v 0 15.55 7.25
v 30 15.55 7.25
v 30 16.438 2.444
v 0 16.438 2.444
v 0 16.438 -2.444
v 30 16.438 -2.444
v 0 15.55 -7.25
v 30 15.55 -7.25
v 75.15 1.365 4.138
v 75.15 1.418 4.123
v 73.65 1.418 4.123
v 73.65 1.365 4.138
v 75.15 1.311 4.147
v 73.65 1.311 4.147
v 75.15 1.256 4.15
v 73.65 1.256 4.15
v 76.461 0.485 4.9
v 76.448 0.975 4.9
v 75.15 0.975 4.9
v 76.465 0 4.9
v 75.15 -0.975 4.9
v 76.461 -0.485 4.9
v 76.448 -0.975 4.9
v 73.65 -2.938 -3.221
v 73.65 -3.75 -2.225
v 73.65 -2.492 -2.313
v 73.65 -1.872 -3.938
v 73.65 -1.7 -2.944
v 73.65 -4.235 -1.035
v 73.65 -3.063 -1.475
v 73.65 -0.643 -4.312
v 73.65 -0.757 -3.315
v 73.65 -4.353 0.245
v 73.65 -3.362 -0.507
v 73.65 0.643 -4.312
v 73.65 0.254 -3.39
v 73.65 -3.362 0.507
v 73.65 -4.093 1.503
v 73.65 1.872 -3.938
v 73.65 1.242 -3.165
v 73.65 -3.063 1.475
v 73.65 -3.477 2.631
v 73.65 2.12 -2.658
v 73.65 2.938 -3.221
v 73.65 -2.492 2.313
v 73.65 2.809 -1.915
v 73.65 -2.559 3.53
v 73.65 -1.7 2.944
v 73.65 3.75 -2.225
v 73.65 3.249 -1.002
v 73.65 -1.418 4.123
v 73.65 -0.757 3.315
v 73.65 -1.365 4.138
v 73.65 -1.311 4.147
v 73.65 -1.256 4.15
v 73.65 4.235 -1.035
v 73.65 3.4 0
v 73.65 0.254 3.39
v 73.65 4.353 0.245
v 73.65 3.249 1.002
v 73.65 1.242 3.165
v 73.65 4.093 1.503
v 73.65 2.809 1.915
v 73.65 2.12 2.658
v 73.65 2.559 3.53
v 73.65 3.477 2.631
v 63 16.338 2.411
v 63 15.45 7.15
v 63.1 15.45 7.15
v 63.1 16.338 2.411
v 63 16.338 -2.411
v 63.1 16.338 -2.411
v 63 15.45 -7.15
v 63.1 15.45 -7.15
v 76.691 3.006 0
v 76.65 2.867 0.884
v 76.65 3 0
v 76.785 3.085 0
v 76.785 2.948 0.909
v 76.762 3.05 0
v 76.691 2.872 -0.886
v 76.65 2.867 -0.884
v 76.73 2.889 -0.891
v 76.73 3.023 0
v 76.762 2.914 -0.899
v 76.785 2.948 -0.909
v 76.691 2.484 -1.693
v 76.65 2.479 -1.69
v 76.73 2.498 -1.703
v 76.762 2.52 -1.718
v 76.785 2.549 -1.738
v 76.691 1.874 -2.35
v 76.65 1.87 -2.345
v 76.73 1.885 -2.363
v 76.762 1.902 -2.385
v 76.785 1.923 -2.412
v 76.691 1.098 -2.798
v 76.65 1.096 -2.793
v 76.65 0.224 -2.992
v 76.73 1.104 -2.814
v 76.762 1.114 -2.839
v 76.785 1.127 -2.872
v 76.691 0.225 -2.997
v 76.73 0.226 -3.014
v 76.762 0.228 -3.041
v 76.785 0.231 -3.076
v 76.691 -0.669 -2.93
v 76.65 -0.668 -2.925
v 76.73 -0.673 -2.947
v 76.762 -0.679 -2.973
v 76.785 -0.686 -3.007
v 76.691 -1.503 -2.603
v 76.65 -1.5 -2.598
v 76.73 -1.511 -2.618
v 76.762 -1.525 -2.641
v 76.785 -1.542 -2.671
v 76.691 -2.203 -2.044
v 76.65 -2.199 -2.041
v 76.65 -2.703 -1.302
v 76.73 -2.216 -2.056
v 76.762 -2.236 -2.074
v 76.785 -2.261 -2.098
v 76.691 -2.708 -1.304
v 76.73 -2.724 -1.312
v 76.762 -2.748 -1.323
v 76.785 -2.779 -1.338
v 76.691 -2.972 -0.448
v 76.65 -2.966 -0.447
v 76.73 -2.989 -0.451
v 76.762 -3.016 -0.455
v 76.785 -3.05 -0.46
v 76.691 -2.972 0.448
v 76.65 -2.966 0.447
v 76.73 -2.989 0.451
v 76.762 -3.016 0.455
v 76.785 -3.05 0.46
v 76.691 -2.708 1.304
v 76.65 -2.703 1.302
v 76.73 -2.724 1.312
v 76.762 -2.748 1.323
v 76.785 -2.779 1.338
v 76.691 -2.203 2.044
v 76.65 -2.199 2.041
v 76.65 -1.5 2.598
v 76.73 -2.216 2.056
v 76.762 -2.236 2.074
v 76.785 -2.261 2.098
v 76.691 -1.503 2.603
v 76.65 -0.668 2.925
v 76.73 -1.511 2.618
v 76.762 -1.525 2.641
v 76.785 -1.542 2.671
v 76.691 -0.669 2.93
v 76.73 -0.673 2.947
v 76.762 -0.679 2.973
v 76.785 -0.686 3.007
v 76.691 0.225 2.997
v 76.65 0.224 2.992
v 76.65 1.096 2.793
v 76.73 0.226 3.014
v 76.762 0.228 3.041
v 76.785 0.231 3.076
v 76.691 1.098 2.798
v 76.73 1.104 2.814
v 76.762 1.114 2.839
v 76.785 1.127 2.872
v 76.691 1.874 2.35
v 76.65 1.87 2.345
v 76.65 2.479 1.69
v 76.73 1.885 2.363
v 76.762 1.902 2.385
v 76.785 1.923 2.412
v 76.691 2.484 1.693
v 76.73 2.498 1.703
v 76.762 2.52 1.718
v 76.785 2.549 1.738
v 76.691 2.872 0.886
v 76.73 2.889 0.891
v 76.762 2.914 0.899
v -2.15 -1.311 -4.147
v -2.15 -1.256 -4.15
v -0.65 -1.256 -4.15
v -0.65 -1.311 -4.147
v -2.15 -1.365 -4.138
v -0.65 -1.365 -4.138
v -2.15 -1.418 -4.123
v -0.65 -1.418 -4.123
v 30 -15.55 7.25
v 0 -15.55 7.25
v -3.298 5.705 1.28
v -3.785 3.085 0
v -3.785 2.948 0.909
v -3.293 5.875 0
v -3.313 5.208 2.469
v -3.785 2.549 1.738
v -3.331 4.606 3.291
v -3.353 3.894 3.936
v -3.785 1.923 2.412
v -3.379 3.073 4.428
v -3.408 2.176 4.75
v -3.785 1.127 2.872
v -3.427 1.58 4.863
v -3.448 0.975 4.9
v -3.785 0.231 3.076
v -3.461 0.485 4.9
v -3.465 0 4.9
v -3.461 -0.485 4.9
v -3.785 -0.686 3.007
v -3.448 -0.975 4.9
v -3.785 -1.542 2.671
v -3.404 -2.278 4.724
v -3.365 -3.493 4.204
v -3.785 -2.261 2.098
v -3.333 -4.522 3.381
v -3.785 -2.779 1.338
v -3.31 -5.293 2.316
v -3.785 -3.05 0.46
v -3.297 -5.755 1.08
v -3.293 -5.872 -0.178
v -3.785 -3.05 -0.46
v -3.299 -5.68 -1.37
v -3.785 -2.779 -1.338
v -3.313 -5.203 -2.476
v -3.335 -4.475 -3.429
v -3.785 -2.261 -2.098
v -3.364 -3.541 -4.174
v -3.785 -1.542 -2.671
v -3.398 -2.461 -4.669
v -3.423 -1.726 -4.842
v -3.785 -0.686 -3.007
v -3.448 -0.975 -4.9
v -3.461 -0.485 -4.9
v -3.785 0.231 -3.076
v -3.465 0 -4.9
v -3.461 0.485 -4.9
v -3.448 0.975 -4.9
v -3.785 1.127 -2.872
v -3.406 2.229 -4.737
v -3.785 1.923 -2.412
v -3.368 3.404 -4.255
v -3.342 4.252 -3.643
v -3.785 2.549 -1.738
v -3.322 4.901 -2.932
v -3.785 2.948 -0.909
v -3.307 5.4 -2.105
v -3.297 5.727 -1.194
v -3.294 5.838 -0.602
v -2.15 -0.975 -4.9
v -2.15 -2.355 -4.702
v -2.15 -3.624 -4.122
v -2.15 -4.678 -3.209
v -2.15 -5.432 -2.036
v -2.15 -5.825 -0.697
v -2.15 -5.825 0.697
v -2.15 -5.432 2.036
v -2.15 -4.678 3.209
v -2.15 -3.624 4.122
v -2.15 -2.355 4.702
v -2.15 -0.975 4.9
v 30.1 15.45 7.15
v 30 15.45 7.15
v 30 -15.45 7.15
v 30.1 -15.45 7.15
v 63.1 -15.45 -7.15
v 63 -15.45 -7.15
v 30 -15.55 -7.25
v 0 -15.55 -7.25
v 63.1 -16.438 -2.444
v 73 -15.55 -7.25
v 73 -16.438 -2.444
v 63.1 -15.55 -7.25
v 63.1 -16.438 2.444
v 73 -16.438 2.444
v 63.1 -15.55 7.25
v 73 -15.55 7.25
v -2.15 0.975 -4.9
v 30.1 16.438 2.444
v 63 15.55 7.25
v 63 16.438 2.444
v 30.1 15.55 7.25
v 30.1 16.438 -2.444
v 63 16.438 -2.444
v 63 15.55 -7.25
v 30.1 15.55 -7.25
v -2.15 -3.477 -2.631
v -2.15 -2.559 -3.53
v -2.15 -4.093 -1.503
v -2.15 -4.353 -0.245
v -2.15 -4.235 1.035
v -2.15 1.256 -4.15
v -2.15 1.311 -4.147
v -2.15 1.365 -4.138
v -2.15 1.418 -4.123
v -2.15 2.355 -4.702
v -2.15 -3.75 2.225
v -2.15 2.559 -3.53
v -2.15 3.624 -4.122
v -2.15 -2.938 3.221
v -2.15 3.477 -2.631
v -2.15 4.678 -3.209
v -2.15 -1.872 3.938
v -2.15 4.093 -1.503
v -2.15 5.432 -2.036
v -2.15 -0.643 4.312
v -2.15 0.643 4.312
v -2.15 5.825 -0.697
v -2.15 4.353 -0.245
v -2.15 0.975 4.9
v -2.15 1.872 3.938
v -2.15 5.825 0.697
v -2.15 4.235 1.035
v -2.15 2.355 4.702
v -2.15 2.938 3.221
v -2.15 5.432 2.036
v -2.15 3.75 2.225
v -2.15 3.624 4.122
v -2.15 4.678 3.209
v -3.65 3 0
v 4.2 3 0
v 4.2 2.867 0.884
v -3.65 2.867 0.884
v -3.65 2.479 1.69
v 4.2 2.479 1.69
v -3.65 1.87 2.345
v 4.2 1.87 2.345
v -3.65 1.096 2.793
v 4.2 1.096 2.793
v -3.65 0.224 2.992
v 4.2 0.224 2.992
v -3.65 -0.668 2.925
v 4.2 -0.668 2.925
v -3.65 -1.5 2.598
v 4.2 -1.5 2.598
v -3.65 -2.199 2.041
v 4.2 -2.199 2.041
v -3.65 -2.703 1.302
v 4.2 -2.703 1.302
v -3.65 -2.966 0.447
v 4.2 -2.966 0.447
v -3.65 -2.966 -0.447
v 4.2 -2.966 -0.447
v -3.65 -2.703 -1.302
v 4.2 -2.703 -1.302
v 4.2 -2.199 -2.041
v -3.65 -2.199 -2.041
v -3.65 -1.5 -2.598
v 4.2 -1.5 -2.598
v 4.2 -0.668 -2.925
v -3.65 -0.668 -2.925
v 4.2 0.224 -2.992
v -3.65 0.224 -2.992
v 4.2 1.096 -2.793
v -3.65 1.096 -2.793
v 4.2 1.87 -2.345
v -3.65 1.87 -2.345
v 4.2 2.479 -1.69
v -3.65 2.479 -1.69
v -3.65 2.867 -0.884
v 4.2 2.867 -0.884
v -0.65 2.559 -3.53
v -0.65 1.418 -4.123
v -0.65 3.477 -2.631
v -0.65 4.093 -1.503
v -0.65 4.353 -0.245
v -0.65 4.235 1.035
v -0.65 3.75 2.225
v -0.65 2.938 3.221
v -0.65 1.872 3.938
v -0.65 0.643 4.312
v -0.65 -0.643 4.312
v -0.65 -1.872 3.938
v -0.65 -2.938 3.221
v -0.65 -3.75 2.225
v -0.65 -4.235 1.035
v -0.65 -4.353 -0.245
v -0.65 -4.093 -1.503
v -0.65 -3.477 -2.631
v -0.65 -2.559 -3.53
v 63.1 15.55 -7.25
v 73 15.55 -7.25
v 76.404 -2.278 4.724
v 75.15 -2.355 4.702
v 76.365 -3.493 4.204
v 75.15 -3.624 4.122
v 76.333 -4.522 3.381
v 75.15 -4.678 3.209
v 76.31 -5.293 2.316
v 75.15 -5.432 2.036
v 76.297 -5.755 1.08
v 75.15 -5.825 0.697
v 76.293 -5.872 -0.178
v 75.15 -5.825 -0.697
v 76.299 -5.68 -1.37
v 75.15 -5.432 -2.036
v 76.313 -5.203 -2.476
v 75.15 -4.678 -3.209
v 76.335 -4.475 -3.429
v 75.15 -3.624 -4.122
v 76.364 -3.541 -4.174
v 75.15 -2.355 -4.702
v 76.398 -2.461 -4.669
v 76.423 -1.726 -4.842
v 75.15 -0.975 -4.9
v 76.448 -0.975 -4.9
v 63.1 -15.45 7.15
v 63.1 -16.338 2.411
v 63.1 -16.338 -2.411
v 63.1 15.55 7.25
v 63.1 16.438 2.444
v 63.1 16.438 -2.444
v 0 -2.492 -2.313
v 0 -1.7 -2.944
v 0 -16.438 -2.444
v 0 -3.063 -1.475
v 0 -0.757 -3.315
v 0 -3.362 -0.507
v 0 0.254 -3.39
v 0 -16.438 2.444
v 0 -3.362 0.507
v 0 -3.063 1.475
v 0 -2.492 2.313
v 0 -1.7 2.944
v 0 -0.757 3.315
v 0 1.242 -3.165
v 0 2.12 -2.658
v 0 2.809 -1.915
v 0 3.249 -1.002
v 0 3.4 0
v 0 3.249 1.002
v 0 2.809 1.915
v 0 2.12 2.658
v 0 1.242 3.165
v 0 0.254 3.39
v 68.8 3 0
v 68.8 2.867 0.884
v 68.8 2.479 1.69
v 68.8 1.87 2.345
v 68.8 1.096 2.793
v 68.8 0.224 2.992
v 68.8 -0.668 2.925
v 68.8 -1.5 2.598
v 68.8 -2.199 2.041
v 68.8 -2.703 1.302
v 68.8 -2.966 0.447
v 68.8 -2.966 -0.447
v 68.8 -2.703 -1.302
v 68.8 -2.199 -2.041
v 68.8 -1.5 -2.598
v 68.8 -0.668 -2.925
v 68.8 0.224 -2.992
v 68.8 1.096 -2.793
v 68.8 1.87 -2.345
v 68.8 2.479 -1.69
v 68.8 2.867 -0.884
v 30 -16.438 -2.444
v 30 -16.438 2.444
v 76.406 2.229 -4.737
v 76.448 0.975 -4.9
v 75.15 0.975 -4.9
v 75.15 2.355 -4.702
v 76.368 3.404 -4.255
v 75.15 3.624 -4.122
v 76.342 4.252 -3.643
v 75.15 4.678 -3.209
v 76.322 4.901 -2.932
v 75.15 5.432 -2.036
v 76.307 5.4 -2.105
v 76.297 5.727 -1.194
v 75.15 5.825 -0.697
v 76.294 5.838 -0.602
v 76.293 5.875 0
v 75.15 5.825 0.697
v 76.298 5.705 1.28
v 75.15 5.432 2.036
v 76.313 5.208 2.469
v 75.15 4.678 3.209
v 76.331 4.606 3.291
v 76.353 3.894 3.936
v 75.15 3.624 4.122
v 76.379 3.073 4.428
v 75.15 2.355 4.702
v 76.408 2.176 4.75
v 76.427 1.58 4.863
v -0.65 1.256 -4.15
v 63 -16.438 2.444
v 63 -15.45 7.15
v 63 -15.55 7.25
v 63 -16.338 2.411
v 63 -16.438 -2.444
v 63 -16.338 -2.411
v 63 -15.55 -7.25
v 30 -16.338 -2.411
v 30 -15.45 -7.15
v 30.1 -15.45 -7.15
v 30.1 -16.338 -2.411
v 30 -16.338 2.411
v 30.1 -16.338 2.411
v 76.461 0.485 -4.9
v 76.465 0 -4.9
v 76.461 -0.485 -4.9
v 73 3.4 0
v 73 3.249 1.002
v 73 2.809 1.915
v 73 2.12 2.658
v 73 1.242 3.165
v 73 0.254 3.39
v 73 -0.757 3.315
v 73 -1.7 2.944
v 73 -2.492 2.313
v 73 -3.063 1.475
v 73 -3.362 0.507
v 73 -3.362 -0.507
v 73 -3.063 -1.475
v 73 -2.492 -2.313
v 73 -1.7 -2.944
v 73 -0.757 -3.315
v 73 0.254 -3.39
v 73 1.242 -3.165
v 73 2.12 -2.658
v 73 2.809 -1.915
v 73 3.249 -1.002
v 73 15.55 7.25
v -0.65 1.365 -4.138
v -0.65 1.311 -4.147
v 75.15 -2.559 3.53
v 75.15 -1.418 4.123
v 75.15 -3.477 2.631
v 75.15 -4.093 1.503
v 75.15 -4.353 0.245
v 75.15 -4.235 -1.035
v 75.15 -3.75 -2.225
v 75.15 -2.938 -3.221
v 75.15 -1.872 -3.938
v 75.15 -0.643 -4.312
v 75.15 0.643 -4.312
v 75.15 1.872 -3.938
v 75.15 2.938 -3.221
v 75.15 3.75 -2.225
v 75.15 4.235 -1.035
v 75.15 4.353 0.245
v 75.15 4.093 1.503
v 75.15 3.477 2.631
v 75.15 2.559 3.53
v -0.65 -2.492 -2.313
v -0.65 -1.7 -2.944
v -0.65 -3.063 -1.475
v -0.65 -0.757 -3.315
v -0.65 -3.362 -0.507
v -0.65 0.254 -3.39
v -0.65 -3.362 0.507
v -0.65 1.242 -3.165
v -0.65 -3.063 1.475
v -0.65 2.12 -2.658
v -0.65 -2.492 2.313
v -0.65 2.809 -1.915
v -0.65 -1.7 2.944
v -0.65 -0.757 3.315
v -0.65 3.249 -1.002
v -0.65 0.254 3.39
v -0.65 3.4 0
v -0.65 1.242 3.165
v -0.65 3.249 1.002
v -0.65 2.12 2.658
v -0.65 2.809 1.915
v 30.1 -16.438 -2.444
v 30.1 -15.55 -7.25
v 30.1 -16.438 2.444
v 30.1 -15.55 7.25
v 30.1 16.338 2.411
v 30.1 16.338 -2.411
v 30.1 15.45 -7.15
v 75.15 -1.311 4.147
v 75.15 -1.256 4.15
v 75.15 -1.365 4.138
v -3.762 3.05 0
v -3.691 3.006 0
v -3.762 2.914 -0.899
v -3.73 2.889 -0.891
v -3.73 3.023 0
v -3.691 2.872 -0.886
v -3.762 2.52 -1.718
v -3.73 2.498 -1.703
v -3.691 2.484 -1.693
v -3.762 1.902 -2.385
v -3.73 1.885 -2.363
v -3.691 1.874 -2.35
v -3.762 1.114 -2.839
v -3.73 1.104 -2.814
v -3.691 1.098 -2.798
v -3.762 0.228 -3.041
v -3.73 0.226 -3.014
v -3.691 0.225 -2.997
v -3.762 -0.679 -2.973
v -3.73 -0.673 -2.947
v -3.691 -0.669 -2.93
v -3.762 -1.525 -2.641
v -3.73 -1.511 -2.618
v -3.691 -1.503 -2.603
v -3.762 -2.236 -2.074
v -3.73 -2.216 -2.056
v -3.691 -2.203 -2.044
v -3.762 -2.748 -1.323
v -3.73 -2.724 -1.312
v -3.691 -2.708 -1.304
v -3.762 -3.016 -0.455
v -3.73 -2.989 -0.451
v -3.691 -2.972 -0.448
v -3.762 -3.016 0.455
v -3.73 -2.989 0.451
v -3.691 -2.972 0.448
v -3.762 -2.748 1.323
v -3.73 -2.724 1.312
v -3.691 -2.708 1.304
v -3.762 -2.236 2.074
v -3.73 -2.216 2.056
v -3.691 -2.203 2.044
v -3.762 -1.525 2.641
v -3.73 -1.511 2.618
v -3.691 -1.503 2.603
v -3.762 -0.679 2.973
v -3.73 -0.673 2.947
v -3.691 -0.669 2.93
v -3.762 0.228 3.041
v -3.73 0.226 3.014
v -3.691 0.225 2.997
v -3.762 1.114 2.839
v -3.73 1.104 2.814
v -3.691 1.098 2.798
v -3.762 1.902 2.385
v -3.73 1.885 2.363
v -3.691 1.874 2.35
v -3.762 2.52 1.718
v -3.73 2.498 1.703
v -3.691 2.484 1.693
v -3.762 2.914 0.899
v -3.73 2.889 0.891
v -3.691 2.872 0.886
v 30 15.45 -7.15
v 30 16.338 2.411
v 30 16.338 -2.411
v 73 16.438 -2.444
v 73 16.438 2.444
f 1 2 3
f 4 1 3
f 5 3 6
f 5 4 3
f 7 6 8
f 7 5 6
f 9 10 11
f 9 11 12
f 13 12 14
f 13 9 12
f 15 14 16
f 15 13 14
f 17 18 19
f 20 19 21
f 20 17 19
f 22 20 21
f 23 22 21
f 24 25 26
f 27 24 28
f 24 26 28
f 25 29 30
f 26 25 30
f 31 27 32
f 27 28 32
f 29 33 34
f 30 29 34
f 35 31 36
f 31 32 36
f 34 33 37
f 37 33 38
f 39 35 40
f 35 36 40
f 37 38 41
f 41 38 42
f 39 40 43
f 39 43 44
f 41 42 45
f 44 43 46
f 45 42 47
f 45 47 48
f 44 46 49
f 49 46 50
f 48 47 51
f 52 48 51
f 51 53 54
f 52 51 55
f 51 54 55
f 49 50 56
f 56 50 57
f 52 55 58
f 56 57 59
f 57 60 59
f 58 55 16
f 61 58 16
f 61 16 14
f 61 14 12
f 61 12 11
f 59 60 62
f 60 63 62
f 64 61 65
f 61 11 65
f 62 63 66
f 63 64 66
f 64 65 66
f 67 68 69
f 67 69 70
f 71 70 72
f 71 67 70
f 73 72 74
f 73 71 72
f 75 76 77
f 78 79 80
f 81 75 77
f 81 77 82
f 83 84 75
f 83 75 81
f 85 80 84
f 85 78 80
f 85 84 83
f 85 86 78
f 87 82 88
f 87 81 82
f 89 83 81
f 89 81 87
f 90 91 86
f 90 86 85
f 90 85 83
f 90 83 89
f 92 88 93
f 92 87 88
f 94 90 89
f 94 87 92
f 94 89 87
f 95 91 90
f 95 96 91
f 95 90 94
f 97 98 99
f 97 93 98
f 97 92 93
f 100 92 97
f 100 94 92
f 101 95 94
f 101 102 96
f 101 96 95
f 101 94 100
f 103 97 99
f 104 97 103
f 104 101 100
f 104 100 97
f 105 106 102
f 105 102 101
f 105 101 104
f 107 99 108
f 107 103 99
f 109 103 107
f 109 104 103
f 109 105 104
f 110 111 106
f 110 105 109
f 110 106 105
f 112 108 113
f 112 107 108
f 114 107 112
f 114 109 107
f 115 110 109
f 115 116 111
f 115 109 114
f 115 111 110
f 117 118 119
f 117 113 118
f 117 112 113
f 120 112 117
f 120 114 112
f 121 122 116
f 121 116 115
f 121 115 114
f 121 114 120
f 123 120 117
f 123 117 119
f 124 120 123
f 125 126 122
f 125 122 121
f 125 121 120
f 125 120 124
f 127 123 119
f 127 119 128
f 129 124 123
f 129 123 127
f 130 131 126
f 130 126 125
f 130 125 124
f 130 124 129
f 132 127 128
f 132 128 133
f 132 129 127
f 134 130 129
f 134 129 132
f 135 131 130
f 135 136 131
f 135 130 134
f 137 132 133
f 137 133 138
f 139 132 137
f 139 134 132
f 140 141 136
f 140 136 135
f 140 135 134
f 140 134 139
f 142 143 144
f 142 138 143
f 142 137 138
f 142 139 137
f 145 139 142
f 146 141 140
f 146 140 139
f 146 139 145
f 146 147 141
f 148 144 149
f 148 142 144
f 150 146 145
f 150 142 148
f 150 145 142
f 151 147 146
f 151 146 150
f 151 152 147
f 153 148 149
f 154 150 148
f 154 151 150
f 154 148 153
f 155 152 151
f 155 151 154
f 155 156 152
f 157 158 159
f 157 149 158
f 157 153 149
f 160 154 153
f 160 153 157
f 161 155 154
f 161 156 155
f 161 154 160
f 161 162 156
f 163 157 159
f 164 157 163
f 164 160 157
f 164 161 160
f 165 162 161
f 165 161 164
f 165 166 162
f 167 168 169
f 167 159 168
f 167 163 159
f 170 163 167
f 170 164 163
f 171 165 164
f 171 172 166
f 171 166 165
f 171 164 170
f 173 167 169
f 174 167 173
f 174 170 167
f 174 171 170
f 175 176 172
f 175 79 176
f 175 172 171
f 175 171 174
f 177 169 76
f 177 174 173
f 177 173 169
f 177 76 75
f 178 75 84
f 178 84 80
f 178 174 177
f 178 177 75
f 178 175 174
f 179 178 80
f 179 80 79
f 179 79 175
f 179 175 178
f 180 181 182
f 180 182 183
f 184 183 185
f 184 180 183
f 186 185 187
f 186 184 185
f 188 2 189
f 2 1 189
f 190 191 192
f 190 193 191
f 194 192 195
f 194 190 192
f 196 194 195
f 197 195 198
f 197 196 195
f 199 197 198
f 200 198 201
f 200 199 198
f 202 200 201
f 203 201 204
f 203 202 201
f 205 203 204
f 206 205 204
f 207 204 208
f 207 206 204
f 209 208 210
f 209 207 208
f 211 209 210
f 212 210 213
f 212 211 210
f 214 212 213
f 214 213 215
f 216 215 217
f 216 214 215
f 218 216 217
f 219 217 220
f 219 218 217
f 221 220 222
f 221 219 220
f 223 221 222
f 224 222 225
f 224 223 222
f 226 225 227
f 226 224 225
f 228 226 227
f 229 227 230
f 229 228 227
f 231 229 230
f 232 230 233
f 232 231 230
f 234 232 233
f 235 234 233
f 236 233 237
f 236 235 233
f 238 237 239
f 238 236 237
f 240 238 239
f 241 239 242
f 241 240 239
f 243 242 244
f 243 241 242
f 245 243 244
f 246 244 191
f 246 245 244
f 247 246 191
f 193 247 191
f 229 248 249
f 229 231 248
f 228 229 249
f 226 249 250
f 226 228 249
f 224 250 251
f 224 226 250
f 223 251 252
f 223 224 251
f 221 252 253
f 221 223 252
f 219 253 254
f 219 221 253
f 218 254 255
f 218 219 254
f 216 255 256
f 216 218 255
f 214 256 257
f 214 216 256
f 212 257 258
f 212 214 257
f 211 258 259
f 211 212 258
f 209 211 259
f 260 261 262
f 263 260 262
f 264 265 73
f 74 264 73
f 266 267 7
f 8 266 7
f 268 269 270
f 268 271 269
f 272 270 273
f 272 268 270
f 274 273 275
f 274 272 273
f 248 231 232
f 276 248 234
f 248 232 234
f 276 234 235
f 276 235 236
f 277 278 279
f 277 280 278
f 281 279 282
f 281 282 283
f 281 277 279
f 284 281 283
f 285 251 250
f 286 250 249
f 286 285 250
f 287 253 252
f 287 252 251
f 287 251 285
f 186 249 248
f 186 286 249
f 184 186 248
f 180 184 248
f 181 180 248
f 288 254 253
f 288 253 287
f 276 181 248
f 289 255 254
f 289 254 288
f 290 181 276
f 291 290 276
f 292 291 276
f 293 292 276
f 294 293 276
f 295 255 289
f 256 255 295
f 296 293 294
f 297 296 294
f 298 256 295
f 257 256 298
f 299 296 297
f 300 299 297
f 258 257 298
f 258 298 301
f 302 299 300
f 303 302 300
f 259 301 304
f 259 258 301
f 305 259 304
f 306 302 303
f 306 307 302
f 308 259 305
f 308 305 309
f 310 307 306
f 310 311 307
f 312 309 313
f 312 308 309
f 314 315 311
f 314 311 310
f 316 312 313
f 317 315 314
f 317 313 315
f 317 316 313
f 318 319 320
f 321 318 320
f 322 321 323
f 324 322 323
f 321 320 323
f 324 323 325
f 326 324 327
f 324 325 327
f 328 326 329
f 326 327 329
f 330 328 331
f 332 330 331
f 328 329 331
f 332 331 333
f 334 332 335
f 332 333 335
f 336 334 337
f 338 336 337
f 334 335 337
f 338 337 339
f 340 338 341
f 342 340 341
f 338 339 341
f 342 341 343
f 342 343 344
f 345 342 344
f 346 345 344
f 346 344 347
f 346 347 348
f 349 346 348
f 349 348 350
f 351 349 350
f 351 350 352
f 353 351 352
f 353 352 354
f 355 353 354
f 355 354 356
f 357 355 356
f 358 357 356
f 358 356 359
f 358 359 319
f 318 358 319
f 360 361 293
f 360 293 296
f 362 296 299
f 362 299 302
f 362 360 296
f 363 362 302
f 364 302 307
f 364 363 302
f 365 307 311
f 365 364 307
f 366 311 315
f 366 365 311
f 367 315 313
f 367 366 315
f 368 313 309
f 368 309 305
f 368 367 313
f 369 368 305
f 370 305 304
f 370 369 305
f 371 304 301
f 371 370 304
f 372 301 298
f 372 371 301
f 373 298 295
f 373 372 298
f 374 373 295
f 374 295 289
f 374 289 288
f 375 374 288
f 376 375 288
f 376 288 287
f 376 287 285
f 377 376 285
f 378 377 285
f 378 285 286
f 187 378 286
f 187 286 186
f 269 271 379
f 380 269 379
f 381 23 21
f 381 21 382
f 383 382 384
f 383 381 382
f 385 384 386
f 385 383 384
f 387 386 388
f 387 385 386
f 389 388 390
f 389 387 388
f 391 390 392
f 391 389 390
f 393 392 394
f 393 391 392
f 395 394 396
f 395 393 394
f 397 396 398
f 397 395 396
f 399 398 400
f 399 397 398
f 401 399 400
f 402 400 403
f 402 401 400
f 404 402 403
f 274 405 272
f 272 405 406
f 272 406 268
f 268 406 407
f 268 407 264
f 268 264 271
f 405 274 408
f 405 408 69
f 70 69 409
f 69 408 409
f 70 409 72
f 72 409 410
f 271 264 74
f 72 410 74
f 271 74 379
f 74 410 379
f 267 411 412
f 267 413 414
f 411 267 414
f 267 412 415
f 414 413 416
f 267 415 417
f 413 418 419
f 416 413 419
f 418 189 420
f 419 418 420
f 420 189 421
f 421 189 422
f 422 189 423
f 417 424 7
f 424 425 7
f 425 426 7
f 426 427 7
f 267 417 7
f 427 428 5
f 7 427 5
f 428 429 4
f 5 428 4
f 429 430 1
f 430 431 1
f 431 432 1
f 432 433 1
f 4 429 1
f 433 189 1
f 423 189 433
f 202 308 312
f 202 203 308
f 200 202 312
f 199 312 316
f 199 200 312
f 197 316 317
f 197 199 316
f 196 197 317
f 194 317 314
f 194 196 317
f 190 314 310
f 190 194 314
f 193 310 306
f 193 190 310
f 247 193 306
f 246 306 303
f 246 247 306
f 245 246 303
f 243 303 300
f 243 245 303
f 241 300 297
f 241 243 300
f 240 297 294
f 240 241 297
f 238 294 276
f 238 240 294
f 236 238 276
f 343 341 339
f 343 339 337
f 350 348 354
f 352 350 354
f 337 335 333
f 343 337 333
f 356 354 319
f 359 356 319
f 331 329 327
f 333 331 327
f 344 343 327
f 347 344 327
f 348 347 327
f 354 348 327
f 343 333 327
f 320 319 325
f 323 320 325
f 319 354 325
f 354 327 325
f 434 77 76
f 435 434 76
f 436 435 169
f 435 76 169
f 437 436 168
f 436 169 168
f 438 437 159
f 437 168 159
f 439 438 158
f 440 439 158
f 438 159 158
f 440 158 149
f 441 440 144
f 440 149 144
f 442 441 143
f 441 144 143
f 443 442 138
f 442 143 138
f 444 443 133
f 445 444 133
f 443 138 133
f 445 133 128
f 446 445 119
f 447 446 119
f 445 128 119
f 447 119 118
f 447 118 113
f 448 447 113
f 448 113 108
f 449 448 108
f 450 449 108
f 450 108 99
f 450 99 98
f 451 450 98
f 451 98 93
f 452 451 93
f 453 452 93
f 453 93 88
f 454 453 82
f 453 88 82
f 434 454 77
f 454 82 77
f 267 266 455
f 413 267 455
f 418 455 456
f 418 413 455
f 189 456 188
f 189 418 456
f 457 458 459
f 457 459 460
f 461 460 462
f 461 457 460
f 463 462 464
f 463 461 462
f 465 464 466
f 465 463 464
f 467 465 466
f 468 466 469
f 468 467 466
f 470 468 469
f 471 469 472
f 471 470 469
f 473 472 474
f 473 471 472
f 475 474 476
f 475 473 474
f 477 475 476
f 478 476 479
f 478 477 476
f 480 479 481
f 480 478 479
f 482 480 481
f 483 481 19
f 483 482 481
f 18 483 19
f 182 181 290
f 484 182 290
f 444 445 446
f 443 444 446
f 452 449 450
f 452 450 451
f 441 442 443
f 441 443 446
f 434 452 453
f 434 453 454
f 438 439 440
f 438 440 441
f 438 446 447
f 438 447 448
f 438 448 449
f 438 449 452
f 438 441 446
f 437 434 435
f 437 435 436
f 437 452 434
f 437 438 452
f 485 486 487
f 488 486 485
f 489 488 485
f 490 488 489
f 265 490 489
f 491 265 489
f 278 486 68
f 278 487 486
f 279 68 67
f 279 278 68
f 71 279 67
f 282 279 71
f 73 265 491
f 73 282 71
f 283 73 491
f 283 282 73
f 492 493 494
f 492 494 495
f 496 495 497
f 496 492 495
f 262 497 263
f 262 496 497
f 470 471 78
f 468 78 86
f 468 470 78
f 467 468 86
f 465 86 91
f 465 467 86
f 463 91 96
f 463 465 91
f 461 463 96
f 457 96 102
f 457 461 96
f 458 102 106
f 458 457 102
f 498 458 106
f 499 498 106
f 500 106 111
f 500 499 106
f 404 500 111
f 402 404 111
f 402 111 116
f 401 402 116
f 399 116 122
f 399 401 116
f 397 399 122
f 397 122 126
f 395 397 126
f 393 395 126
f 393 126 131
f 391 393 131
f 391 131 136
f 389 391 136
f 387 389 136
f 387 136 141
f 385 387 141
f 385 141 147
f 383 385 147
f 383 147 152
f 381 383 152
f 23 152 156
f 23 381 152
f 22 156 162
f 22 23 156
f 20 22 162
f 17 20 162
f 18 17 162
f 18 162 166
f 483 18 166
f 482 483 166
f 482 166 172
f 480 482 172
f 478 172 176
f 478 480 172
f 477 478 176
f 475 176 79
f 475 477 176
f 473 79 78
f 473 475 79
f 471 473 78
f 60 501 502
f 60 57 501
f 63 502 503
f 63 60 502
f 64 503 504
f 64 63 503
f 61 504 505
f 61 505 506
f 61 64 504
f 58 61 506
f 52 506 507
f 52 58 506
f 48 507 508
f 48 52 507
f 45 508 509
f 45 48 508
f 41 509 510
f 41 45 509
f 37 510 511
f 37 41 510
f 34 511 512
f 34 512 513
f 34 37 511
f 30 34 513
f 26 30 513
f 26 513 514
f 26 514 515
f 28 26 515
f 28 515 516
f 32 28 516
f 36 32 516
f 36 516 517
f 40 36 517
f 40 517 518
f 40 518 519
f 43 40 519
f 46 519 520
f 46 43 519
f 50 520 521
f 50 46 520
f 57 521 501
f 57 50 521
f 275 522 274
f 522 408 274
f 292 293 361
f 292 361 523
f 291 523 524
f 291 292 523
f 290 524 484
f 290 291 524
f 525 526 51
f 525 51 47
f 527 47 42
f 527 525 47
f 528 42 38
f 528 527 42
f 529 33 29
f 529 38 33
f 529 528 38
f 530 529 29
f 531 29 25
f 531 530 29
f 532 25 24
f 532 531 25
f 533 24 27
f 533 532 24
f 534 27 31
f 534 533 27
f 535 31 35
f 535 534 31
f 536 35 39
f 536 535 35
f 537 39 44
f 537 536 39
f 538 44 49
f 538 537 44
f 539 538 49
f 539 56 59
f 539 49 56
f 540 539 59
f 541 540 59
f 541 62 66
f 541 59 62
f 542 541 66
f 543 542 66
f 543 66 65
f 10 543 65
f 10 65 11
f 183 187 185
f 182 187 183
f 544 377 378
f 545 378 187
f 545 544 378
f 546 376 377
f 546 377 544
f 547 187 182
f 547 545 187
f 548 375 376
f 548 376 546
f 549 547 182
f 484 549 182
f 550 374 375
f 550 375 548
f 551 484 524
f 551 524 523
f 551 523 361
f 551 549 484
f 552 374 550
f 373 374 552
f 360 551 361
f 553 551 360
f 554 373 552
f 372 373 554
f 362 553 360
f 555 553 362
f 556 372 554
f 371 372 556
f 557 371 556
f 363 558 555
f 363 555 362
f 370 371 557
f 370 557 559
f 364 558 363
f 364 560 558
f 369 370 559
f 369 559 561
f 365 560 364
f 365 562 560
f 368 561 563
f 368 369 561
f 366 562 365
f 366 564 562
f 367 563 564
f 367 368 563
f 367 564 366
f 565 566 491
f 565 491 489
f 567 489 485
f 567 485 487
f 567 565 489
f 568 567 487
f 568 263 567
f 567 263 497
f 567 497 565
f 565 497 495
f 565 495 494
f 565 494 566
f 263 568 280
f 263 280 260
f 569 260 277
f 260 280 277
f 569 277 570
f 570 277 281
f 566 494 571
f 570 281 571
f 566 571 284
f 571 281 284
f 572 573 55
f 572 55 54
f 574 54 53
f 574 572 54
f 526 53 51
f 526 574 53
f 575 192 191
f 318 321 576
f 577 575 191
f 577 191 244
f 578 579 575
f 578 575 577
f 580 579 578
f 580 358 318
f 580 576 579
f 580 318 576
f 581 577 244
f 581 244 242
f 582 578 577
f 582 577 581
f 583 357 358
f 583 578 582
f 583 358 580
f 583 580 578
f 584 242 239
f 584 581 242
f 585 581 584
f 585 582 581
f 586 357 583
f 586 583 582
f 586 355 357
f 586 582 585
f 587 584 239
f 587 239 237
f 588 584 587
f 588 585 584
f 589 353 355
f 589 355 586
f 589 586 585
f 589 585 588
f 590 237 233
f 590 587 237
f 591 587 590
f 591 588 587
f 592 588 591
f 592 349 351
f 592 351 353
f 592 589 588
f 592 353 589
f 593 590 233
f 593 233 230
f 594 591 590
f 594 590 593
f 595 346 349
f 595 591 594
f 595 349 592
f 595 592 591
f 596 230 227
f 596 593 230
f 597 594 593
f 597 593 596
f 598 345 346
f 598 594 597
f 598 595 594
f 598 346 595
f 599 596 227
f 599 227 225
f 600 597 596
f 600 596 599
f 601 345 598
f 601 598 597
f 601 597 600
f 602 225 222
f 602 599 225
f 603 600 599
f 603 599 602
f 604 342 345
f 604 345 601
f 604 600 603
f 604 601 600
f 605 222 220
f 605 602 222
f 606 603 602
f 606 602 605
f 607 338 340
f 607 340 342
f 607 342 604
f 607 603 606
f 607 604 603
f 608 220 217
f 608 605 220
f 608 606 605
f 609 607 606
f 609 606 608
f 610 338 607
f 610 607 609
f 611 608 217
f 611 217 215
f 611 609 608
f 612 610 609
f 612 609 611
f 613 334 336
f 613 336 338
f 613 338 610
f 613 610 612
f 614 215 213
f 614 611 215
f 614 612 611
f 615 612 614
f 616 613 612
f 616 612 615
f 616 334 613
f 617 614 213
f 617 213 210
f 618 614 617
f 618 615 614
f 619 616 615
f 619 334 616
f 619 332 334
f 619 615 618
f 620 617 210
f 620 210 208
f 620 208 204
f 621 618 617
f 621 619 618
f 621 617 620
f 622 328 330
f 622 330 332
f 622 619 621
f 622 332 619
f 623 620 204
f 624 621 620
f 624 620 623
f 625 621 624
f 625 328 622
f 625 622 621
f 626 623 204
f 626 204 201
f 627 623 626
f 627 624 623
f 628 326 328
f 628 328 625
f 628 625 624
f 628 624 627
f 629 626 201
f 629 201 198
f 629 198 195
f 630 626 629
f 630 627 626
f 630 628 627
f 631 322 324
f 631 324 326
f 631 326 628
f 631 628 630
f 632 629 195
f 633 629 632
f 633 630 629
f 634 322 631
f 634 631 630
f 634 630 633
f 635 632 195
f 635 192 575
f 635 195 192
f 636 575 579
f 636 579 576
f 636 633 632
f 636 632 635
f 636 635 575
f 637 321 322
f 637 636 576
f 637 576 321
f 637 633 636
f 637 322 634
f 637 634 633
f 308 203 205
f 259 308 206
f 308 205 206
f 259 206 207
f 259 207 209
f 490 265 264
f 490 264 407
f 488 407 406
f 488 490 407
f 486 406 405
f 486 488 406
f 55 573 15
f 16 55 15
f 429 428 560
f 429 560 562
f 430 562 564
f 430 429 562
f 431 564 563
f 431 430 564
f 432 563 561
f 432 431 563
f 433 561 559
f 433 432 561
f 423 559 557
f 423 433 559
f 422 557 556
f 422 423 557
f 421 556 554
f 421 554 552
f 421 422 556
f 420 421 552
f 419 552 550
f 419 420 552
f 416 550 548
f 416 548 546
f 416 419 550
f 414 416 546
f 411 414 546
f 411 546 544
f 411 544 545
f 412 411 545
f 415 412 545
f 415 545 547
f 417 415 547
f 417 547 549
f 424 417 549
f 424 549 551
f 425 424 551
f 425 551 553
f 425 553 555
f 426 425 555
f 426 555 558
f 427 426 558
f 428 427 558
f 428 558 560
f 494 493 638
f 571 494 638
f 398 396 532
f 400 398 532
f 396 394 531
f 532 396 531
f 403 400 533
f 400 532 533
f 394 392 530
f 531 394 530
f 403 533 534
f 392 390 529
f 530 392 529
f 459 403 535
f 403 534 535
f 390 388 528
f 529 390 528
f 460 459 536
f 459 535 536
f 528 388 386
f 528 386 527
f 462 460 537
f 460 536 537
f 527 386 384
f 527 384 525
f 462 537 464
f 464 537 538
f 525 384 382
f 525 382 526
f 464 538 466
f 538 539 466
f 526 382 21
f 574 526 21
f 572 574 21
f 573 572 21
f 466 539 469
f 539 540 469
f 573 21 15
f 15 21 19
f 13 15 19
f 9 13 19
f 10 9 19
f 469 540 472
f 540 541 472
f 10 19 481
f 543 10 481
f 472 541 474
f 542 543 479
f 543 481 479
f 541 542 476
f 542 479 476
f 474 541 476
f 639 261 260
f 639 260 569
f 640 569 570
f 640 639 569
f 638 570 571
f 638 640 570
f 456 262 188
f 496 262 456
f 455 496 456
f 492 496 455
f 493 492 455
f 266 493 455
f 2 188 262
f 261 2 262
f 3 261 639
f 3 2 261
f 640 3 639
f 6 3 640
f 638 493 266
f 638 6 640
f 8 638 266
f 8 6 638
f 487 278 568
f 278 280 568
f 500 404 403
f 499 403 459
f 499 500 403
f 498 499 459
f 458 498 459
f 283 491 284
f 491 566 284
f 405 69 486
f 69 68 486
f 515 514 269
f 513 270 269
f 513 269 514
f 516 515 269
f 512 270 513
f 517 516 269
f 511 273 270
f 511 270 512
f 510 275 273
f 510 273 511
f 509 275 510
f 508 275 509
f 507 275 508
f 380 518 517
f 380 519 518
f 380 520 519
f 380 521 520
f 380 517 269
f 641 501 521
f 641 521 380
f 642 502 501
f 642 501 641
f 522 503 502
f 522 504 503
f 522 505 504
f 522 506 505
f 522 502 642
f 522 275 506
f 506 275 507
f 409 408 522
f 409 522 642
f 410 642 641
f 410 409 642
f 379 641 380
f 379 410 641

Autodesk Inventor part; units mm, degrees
ref_plane "YZ Plane" through (0, 0, 0) normal (1, 0, 0) x (0, 1, 0)
ref_plane "XZ Plane" through (0, 0, 0) normal (0, 1, 0) x (-1, 0, 0)
ref_plane "XY Plane" through (0, 0, 0) normal (0, 0, 1) x (1, 0, 0)
sketch "Sketch_1" plane through (0, 0, 0) normal (1, 0, 0) x (0, 1, 0)
  arc A0 (-15.55, 7.25) -> (-15.55, -7.25) centre (10.2312, 0) ccw
  line L0 (-15.55, -7.25) -> (15.55, -7.25)
  arc A1 (15.55, -7.25) -> (15.55, 7.25) centre (-10.2312, 0) ccw
  line L1 (15.55, 7.25) -> (-15.55, 7.25)
extrude "Extrusion1" add sketch "Sketch_1" along normal blind 73
sketch "Sketch_8" plane through (0, 0, 0) normal (0, 0, 1) x (1, 0, 0)
  line L0 (0, 0) -> (-3.8, 0)
  line L1 (-3.8, 0) -> (-3.8, 3)
  line L2 (-3.8, 3) -> (-3.271, 6)
  line L3 (-3.271, 6) -> (-2.15, 6)
  line L4 (-2.15, 6) -> (-2.15, 4.36)
  line L5 (-2.15, 4.36) -> (-0.65, 4.36)
  line L6 (-0.65, 4.36) -> (-0.65, 3.4)
  line L7 (-0.65, 3.4) -> (0, 3.4)
  line L8 (0, 3.4) -> (0, 0)
  line L9 (0, 0) -> (-3.8, 0)
revolve "Revolution1" add sketch "Sketch_8" angle 360 about axis through (0, 0, 0) along (1, 0, 0)
sketch "Sketch_2" plane through (0, 0, 0) normal (0, 0, 1) x (1, 0, 0)
  line L0 (4.2, 0) -> (-3.95, 0)
  line L1 (-3.95, 0) -> (-3.95, 3.15)
  line L2 (-3.95, 3.15) -> (-3.8, 3.15)
  arc A0 (-3.8, 3.15) -> (-3.65, 3) centre (-3.65, 3.15) ccw
  line L3 (-3.65, 3) -> (4.2, 3)
  line L4 (4.2, 3) -> (4.2, 0)
  line L5 (4.2, 0) -> (-3.95, 0)
revolve "Revolution2" cut sketch "Sketch_2" angle 360 about axis through (4.2, 0, 0) along (1, 0, 0)
sketch "Sketch_9" plane through (-3.8, 0, 0) normal (1, 0, 0) x (0, 0, -1)
  circle A0 centre (0, 0) radius 7
  arc A1 (-4.9, -0.975) -> (4.9, -0.975) centre (0, -0.975) ccw
  line L0 (4.9, -0.975) -> (4.9, 0.975)
  arc A2 (4.9, 0.975) -> (-4.9, 0.975) centre (0, 0.975) ccw
  line L1 (-4.9, 0.975) -> (-4.9, -0.975)
extrude "Extrusion2" cut sketch "Sketch_9" along normal blind 1.65
sketch "Sketch_10" plane through (-2.15, 0, 0) normal (1, 0, 0) x (0, 1, 0)
  circle A0 centre (0, 0) radius 6
  arc A1 (1.4185, -4.1228) -> (-1.4185, -4.1228) centre (0, 0) ccw
  arc A2 (-1.4185, -4.1228) -> (-1.2558, -4.15) centre (-1.2558, -3.65) ccw
  line L0 (-1.2558, -4.15) -> (1.2558, -4.15)
  arc A3 (1.2558, -4.15) -> (1.4185, -4.1228) centre (1.2558, -3.65) ccw
extrude "Extrusion3" cut sketch "Sketch_10" along normal blind 1.5
sketch "Sketch_3" plane through (0, 0, 0) normal (0, 0, 1) x (1, 0, 0)
  line L0 (76.8, 0) -> (73, 0)
  line L1 (73, 0) -> (73, 3.4)
  line L2 (73, 3.4) -> (73.65, 3.4)
  line L3 (73.65, 3.4) -> (73.65, 4.36)
  line L4 (73.65, 4.36) -> (75.15, 4.36)
  line L5 (75.15, 4.36) -> (75.15, 6)
  line L6 (75.15, 6) -> (76.271, 6)
  line L7 (76.271, 6) -> (76.8, 3)
  line L8 (76.8, 3) -> (76.8, 0)
  line L9 (76.8, 0) -> (73, 0)
revolve "Revolution3" add sketch "Sketch_3" angle 360 about axis through (76.8, 0, 0) along (1, 0, 0)
sketch "Sketch_4" plane through (0, 0, 0) normal (0, 0, 1) x (1, 0, 0)
  line L0 (76.95, 0) -> (68.8, 0)
  line L1 (68.8, 0) -> (68.8, 3)
  line L2 (68.8, 3) -> (76.65, 3)
  arc A0 (76.65, 3) -> (76.8, 3.15) centre (76.65, 3.15) ccw
  line L3 (76.8, 3.15) -> (76.95, 3.15)
  line L4 (76.95, 3.15) -> (76.95, 0)
  line L5 (76.95, 0) -> (68.8, 0)
revolve "Revolution4" cut sketch "Sketch_4" angle 360 about axis through (76.95, 0, 0) along (1, 0, 0)
sketch "Sketch_5" plane through (76.8, 0, 0) normal (1, 0, 0) x (0, 0, -1)
  circle A0 centre (0, 0) radius 7
  arc A1 (-4.9, -0.975) -> (4.9, -0.975) centre (0, -0.975) ccw
  line L0 (4.9, -0.975) -> (4.9, 0.975)
  arc A2 (4.9, 0.975) -> (-4.9, 0.975) centre (0, 0.975) ccw
  line L1 (-4.9, 0.975) -> (-4.9, -0.975)
extrude "Extrusion4" cut sketch "Sketch_5" against normal blind 1.65
sketch "Sketch_11" plane through (75.15, 0, 0) normal (-1, 0, 0) x (0, 1, 0)
  circle A0 centre (0, 0) radius 6
  arc A1 (1.4185, -4.1228) -> (-1.4185, -4.1228) centre (0, 0) ccw
  arc A2 (-1.4185, -4.1228) -> (-1.2558, -4.15) centre (-1.2558, -3.65) ccw
  line L0 (-1.2558, -4.15) -> (1.2558, -4.15)
  arc A3 (1.2558, -4.15) -> (1.4185, -4.1228) centre (1.2558, -3.65) ccw
extrude "Extrusion5" cut sketch "Sketch_11" along normal blind 1.5
sketch "Sketch_6" plane through (30, 0, 0) normal (1, 0, 0) x (0, 0, -1)
  line L0 (-10, -20) -> (10, -20)
  line L1 (10, -20) -> (10, 20)
  line L2 (10, 20) -> (-10, 20)
  line L3 (-10, 20) -> (-10, -20)
  arc A0 (-7.15, -15.45) -> (7.15, -15.45) centre (0, 9.6112) ccw
  line L4 (7.15, -15.45) -> (7.15, 15.45)
  arc A1 (7.15, 15.45) -> (-7.15, 15.45) centre (0, -9.6112) ccw
  line L5 (-7.15, 15.45) -> (-7.15, -15.45)
extrude "Extrusion6" cut sketch "Sketch_6" along normal blind 0.1
sketch "Sketch_7" plane through (63, 0, 0) normal (1, 0, 0) x (0, 0, -1)
  line L0 (-10, -20) -> (10, -20)
  line L1 (10, -20) -> (10, 20)
  line L2 (10, 20) -> (-10, 20)
  line L3 (-10, 20) -> (-10, -20)
  arc A0 (-7.15, -15.45) -> (7.15, -15.45) centre (0, 9.6112) ccw
  line L4 (7.15, -15.45) -> (7.15, 15.45)
  arc A1 (7.15, 15.45) -> (-7.15, 15.45) centre (0, -9.6112) ccw
  line L5 (-7.15, 15.45) -> (-7.15, -15.45)
extrude "Extrusion7" cut sketch "Sketch_7" along normal blind 0.1
properties part number "532624 VN-05-M-I3-PQ2-VQ2-A"
